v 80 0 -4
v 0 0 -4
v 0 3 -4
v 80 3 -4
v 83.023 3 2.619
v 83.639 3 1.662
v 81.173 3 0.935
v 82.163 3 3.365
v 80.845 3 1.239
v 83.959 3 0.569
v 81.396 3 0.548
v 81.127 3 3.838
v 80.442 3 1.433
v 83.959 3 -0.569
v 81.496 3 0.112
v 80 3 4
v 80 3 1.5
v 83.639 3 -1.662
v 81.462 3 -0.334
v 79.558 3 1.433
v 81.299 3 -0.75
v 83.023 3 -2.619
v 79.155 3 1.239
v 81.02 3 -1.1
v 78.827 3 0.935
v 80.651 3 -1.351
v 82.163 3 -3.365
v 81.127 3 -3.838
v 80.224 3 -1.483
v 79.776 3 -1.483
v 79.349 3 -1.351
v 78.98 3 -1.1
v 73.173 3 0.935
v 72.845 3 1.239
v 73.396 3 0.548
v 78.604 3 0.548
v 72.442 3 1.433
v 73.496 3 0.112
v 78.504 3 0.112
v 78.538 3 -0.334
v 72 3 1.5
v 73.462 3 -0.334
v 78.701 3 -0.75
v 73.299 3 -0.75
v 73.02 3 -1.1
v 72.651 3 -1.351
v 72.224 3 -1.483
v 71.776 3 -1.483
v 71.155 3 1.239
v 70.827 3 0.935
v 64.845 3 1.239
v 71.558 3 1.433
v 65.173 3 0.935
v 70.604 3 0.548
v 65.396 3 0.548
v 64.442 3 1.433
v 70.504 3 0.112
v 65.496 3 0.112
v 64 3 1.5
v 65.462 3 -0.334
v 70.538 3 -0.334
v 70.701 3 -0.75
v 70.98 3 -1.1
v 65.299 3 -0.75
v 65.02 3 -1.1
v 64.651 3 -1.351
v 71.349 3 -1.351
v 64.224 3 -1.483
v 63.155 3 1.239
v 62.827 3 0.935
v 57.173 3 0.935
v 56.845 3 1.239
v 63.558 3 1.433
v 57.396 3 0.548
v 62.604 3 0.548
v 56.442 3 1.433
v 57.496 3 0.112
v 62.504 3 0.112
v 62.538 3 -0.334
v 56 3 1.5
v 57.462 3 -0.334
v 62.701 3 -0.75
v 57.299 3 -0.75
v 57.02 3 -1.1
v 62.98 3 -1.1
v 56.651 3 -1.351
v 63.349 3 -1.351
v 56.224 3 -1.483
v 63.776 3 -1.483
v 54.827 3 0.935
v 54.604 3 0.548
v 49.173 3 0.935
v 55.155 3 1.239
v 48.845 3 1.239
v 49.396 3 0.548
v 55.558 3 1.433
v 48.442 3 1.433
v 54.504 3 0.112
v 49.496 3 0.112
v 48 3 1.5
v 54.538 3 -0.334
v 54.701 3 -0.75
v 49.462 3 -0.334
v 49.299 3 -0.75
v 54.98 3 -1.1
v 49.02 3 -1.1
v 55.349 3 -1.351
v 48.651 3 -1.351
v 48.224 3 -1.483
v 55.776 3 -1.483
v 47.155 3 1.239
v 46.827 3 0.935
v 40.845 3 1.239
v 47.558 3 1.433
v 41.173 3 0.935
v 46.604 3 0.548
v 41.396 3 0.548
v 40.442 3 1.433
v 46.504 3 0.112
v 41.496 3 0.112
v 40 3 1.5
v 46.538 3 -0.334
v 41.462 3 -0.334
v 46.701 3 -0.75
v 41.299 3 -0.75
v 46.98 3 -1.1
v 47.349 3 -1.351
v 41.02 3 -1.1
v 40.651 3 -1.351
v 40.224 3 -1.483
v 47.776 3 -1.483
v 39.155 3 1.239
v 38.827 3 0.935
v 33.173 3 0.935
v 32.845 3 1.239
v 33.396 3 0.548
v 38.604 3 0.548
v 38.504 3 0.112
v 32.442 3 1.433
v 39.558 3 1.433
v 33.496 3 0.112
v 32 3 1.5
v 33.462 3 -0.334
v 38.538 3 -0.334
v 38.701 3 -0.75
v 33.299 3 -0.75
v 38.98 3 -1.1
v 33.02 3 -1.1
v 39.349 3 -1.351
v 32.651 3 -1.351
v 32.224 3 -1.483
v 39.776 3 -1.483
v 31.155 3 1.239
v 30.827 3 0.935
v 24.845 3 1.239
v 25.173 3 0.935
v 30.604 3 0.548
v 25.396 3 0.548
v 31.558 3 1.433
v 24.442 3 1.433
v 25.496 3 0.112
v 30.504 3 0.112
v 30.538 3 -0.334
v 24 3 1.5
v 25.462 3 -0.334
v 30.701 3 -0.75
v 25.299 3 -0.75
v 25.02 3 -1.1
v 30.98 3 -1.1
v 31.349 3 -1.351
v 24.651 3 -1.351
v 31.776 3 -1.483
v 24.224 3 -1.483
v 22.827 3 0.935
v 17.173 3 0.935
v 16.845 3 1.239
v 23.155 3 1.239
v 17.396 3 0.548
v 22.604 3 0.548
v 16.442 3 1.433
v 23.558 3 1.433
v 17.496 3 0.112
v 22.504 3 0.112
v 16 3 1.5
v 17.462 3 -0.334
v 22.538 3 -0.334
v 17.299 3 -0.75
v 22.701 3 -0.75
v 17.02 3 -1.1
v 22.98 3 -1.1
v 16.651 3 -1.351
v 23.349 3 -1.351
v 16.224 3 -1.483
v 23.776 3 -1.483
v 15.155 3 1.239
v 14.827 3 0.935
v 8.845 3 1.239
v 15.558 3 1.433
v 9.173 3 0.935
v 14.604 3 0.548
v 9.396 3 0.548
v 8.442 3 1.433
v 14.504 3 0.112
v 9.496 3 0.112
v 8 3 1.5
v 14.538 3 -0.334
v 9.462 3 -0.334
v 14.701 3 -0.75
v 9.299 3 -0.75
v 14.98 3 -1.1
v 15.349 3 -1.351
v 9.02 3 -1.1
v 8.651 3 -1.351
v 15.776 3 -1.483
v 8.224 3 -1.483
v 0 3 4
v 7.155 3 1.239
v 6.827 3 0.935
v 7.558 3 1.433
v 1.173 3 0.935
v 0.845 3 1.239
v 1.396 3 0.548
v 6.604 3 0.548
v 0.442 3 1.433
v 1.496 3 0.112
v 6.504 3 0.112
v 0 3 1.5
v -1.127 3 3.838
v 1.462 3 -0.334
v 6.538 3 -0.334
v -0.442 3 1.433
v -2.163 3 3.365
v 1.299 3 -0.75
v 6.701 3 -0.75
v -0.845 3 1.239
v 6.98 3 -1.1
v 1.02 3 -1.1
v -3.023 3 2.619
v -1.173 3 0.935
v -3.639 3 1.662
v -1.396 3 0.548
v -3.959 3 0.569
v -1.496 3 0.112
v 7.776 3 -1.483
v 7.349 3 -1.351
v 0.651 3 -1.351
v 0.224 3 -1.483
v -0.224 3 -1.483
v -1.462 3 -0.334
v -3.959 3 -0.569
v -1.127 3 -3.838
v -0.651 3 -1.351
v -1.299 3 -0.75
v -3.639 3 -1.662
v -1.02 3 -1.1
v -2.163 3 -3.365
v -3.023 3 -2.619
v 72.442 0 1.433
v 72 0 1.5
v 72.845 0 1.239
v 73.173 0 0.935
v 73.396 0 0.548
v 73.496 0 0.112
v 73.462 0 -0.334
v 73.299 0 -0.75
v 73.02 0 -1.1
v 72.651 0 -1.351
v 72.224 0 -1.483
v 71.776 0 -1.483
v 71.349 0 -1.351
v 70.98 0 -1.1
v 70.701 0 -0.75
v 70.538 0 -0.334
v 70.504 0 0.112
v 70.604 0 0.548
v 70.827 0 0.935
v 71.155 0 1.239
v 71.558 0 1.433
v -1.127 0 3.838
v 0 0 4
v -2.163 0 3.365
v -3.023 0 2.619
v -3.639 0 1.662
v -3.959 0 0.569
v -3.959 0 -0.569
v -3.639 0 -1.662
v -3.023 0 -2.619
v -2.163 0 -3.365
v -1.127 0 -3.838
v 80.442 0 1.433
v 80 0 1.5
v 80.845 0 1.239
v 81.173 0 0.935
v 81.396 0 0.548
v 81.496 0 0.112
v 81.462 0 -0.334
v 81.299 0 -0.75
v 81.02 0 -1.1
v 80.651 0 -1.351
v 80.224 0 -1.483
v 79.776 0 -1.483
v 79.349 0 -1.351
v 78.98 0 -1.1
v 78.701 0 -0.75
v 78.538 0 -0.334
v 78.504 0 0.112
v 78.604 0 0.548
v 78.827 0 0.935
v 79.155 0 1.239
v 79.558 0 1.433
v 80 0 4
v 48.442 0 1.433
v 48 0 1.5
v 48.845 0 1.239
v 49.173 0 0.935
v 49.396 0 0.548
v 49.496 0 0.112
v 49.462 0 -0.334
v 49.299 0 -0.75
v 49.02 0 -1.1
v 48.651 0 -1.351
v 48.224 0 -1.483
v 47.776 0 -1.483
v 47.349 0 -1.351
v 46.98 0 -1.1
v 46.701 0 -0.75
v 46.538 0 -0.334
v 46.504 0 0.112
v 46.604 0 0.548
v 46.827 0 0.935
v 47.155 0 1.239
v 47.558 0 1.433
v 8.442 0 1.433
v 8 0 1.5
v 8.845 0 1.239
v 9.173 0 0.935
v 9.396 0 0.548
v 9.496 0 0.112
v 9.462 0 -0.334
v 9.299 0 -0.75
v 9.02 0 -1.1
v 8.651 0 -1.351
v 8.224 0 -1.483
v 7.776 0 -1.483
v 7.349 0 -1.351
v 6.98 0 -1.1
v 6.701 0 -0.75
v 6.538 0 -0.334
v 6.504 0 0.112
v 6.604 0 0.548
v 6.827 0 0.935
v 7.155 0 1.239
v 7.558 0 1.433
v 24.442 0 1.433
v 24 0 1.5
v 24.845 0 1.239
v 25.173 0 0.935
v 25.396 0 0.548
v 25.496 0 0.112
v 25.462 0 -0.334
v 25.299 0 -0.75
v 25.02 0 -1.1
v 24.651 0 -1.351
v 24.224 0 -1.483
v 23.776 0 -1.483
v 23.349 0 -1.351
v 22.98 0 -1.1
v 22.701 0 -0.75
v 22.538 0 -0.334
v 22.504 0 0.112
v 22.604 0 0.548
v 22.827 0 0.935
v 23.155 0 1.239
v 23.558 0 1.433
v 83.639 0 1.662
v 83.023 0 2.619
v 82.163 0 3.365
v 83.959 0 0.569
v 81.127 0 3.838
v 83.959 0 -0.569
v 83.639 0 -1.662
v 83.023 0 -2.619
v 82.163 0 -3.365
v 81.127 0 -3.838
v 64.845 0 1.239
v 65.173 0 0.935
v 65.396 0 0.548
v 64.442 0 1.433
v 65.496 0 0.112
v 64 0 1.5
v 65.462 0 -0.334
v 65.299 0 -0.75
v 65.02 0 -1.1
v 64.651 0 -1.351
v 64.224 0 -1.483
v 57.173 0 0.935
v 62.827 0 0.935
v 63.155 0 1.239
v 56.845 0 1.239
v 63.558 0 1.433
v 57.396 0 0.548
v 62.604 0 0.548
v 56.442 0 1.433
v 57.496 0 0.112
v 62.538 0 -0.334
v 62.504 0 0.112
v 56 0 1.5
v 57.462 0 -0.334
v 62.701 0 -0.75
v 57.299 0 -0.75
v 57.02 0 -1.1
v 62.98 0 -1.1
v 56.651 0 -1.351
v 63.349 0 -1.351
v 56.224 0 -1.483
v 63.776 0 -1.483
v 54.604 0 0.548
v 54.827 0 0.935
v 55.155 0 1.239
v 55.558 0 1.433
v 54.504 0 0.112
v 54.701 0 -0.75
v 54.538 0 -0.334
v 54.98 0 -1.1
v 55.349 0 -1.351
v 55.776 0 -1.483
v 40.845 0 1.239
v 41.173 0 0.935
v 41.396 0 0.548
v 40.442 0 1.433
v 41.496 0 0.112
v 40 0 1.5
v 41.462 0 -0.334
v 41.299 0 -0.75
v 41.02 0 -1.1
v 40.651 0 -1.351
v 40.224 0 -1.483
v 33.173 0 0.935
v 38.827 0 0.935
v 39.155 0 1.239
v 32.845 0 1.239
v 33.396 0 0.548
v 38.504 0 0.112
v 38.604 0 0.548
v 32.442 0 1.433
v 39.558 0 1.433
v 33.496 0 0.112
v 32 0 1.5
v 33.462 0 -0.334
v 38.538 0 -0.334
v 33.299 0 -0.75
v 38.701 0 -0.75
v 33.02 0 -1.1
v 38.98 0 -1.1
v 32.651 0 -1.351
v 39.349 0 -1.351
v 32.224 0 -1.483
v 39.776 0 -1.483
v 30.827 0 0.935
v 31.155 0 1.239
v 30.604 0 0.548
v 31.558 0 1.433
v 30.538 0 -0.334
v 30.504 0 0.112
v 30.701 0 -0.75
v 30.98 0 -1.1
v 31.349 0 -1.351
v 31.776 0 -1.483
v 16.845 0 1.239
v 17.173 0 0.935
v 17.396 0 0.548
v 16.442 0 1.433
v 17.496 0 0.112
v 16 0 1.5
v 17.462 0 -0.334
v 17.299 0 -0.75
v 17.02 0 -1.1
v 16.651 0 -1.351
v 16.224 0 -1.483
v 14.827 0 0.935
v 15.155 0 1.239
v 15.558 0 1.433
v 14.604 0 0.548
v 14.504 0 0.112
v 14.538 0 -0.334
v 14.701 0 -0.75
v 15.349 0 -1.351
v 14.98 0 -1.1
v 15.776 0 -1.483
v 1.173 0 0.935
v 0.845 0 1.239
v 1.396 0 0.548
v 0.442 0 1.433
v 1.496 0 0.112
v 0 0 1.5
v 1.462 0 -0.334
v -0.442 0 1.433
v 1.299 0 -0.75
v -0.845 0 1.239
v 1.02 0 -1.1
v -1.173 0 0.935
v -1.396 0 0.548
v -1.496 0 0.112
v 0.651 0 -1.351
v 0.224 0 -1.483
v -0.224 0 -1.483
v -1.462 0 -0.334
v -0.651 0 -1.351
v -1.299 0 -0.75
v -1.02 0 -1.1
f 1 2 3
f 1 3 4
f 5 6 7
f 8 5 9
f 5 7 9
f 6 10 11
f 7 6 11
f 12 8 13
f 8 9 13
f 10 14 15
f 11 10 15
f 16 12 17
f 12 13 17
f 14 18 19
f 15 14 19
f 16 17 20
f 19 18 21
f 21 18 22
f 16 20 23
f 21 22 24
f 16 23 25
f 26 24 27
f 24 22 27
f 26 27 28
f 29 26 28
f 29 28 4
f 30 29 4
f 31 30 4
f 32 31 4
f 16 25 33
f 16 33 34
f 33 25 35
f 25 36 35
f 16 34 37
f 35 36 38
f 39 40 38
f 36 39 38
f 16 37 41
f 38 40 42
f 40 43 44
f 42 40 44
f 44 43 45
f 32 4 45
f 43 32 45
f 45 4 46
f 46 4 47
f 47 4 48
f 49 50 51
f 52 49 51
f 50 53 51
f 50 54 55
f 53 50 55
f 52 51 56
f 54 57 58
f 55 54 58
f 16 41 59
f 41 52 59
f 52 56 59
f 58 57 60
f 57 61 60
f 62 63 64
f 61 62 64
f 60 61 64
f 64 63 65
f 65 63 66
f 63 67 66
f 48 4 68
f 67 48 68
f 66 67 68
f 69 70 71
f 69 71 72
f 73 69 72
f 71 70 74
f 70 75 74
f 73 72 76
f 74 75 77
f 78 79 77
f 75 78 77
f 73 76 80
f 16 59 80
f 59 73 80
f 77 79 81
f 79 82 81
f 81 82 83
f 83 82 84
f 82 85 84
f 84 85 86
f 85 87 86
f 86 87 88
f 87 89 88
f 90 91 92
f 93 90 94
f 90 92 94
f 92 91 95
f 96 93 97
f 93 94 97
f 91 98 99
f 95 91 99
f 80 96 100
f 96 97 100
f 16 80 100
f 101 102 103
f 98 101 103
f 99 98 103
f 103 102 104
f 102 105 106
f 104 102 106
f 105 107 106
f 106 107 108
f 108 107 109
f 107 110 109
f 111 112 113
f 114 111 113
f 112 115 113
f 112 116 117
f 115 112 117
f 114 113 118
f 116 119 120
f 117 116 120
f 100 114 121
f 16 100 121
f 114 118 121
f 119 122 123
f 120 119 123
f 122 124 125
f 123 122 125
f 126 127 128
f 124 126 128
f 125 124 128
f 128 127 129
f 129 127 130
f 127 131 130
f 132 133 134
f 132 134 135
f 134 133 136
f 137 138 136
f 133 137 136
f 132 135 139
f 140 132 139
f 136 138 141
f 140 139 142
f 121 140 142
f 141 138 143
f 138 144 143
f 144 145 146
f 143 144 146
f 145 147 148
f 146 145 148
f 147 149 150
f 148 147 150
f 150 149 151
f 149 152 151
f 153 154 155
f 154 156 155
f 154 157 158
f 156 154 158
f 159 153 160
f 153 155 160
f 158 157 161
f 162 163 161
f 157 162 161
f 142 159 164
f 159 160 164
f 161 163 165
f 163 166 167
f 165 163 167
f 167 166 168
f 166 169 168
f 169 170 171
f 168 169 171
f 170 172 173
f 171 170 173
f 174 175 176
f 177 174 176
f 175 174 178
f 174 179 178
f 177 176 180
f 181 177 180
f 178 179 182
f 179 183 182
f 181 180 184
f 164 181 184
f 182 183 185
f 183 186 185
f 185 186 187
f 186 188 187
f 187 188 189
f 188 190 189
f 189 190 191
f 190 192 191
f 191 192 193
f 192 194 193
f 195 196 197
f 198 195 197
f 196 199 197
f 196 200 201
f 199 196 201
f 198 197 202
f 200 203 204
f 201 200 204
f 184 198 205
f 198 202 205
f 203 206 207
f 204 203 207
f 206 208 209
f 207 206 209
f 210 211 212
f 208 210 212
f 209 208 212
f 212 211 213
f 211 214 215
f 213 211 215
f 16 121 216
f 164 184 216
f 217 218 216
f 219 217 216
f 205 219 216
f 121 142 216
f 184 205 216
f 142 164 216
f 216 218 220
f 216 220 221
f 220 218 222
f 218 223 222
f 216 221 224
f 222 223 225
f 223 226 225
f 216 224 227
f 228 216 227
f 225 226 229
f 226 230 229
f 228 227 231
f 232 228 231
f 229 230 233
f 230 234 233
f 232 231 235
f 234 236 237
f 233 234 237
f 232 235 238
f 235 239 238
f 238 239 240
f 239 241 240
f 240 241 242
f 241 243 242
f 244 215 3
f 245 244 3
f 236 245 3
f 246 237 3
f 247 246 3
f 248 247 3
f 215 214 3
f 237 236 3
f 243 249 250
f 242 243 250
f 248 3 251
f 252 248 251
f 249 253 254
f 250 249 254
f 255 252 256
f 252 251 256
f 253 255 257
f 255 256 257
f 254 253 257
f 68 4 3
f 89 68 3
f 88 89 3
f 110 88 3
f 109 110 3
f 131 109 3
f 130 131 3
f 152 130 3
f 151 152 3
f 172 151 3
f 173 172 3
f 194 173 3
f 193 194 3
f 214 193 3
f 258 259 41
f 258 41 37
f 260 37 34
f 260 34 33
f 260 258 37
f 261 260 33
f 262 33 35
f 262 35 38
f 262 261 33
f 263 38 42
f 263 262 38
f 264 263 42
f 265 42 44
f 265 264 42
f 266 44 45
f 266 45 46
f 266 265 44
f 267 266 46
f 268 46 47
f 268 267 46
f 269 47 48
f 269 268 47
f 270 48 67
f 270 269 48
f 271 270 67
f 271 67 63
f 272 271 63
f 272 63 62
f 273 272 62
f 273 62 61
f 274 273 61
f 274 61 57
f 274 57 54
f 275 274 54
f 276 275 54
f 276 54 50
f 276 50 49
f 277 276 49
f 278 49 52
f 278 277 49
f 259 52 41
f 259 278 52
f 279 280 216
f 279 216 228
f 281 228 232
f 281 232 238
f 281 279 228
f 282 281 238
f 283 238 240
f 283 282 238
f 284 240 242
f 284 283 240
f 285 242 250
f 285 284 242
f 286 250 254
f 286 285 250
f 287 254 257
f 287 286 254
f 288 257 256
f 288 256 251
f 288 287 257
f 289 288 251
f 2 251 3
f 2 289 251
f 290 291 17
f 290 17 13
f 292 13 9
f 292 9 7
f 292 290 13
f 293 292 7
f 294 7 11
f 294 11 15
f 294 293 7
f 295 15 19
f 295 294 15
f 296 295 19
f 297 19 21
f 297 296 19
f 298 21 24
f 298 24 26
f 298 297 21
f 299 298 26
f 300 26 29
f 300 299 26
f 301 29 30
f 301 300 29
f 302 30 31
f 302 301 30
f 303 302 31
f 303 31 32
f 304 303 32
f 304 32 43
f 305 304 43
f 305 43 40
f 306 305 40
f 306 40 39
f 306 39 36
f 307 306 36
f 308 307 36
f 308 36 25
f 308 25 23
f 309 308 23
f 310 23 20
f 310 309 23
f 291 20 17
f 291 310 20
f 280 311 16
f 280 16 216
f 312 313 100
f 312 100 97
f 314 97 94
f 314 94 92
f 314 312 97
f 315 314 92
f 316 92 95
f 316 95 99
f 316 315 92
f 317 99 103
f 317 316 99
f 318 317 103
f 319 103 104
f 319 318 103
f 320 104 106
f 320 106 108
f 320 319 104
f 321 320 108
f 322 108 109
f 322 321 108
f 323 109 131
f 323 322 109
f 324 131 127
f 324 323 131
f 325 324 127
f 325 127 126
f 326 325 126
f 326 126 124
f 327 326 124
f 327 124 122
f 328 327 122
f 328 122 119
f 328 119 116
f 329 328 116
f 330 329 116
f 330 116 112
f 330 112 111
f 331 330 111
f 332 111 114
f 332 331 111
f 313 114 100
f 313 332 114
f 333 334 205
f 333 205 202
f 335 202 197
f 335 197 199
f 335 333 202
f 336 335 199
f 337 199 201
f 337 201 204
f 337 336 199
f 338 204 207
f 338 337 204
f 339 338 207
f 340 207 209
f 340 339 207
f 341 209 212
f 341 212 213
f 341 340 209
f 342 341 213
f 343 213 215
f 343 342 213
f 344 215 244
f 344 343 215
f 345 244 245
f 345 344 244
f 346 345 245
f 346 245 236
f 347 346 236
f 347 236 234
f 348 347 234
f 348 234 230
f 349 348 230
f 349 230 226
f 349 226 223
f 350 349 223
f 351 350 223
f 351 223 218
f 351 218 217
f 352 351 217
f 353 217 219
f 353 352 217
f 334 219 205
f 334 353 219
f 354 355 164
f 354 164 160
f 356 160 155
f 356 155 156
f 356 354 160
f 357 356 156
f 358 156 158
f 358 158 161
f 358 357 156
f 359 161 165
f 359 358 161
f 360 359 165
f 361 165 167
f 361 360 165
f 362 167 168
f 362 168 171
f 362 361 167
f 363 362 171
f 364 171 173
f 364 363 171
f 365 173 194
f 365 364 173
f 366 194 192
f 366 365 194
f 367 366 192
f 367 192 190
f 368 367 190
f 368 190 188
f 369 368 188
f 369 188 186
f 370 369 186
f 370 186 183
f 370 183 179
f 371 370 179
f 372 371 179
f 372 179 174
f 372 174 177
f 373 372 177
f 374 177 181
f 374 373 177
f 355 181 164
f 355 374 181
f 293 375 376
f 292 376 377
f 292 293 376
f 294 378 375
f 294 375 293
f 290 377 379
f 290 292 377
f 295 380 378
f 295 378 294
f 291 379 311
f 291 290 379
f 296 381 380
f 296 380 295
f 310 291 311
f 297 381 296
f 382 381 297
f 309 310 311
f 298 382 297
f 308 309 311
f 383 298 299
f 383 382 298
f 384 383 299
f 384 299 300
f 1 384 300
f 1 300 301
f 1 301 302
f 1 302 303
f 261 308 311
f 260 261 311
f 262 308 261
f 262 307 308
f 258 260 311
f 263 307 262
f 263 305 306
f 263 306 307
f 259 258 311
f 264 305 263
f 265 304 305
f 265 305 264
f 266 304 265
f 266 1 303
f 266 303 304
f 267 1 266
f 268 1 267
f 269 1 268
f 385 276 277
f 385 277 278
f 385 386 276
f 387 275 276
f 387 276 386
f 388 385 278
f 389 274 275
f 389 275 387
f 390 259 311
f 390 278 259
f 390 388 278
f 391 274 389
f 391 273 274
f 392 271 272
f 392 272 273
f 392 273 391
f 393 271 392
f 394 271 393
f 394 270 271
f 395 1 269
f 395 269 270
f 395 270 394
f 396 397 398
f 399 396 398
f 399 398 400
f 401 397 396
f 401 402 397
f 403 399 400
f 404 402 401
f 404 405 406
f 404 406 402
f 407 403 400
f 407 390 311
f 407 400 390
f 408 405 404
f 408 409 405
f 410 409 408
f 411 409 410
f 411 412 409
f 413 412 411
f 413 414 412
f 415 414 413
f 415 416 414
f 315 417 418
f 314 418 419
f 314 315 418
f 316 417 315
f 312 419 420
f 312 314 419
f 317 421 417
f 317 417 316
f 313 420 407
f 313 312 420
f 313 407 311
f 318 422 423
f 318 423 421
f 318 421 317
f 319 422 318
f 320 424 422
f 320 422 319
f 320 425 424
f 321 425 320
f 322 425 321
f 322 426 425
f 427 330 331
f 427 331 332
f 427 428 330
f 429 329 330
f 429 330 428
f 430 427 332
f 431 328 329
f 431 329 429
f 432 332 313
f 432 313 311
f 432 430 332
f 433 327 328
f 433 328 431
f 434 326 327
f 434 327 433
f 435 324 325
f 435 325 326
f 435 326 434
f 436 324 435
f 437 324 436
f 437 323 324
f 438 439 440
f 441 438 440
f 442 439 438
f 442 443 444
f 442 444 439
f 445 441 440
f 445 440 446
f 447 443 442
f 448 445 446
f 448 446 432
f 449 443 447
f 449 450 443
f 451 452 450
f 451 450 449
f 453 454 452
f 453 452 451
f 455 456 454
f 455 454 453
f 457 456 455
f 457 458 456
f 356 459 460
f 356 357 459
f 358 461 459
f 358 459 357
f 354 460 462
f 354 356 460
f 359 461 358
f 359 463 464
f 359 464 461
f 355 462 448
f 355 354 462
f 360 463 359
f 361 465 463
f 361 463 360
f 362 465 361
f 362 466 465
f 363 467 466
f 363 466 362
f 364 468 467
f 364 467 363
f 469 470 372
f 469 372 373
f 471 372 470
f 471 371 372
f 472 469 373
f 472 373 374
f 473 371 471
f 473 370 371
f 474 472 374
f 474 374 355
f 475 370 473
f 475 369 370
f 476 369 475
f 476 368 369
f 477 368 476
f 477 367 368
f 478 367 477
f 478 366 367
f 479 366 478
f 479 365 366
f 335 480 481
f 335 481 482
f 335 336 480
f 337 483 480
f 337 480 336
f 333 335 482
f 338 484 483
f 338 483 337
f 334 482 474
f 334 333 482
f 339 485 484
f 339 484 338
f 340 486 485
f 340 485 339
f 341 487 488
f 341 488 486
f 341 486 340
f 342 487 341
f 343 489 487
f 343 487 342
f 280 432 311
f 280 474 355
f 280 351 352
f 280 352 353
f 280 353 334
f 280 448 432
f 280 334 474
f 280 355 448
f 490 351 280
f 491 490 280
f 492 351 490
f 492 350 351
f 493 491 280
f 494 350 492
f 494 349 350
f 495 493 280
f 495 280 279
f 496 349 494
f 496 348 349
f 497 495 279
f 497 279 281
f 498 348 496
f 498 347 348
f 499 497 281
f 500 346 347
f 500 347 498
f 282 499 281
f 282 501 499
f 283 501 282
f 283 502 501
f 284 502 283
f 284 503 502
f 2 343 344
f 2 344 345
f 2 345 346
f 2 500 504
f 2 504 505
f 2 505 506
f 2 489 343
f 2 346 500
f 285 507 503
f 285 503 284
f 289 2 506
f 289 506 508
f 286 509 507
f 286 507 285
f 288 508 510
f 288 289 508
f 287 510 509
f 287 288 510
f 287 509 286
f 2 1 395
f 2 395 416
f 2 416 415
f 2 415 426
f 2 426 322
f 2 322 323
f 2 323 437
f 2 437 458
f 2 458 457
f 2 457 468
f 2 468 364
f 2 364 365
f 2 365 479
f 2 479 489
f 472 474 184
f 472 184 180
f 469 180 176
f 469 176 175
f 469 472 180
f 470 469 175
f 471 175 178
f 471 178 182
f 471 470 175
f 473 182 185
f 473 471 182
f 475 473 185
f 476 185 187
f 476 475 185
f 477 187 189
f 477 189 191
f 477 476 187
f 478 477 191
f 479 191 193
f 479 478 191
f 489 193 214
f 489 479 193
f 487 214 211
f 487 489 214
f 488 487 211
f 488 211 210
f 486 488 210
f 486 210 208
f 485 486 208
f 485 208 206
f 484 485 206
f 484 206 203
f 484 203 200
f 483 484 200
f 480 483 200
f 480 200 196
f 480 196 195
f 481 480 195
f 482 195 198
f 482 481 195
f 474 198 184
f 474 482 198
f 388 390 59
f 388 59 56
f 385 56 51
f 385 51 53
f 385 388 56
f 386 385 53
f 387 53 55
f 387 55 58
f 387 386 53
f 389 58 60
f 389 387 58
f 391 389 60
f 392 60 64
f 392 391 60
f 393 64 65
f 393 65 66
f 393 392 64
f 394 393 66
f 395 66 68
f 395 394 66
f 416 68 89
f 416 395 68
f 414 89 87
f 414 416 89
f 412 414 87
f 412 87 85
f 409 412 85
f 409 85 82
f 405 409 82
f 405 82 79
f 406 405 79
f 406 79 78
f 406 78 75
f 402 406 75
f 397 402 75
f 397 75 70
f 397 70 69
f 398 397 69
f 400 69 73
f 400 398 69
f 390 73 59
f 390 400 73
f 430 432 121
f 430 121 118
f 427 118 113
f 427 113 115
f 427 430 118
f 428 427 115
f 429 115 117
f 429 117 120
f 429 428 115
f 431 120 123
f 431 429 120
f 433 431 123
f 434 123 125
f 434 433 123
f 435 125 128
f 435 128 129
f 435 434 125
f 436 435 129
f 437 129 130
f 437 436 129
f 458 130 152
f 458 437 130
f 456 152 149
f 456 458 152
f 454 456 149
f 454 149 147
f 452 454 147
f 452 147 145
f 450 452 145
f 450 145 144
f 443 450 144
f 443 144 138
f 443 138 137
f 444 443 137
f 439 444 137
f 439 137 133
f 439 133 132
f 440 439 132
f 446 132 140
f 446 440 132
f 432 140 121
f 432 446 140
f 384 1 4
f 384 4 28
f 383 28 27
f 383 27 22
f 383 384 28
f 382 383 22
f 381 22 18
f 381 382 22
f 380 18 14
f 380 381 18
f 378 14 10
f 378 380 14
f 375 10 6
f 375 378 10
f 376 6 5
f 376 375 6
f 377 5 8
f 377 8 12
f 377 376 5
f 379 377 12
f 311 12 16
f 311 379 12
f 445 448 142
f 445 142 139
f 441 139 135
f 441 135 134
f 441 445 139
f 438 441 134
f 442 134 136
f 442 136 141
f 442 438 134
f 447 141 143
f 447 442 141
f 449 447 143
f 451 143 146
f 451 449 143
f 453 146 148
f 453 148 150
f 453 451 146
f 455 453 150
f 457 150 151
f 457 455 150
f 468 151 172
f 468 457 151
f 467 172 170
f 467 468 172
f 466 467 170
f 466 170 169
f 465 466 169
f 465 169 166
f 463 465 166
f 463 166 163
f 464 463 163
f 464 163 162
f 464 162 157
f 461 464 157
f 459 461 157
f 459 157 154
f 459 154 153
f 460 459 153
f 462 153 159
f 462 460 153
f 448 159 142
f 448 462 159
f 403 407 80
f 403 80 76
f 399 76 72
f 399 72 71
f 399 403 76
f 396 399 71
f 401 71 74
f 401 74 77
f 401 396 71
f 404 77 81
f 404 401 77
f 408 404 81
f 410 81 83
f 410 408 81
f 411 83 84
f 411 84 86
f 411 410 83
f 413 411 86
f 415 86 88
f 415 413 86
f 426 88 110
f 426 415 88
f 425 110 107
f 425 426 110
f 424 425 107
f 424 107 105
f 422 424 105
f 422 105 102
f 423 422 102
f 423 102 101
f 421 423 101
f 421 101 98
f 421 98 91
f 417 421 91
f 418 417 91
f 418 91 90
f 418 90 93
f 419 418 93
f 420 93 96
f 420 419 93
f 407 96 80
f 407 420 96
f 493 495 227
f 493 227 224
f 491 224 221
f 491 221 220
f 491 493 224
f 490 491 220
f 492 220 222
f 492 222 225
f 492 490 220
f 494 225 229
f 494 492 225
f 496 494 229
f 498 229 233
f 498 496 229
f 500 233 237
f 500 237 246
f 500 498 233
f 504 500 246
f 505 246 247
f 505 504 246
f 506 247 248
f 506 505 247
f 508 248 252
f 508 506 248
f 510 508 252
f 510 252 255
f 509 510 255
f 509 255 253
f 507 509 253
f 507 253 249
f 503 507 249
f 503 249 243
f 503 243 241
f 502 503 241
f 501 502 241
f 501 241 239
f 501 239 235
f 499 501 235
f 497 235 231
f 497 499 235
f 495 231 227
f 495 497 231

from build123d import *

# Parameters (mm, degrees)
SKETCH2_R           = 1.5
BOSS_EXTRUDE2_DEPTH = 3


with BuildPart() as part:
    # Sketch2 → Boss-Extrude2 (new body)
    with BuildSketch(Plane(origin=(0, 0, 0), x_dir=(1, 0, 0), z_dir=(0, 1, 0))):
        with BuildLine():
            Line((0, 4), (80, 4))
            ThreePointArc((80, 4), (84, 0), (80, -4))
            Line((80, -4), (0, -4))
            ThreePointArc((0, -4), (-4, 0), (0, 4))
        make_face()
        with Locations(Location((0, 0, 0), (0, 0, 270))):
            Circle(SKETCH2_R, mode=Mode.SUBTRACT)
        with Locations(Location((8, 0, 0), (0, 0, 270))):
            Circle(SKETCH2_R, mode=Mode.SUBTRACT)
        with Locations(Location((16, 0, 0), (0, 0, 270))):
            Circle(SKETCH2_R, mode=Mode.SUBTRACT)
        with Locations(Location((24, 0, 0), (0, 0, 270))):
            Circle(SKETCH2_R, mode=Mode.SUBTRACT)
        with Locations(Location((32, 0, 0), (0, 0, 270))):
            Circle(SKETCH2_R, mode=Mode.SUBTRACT)
        with Locations(Location((40, 0, 0), (0, 0, 270))):
            Circle(SKETCH2_R, mode=Mode.SUBTRACT)
        with Locations(Location((48, 0, 0), (0, 0, 270))):
            Circle(SKETCH2_R, mode=Mode.SUBTRACT)
        with Locations(Location((56, 0, 0), (0, 0, 270))):
            Circle(SKETCH2_R, mode=Mode.SUBTRACT)
        with Locations(Location((64, 0, 0), (0, 0, 270))):
            Circle(SKETCH2_R, mode=Mode.SUBTRACT)
        with Locations(Location((72, 0, 0), (0, 0, 270))):
            Circle(SKETCH2_R, mode=Mode.SUBTRACT)
        with Locations(Location((80, 0, 0), (0, 0, 270))):
            Circle(SKETCH2_R, mode=Mode.SUBTRACT)
    extrude(amount=BOSS_EXTRUDE2_DEPTH)


solid = part.part
